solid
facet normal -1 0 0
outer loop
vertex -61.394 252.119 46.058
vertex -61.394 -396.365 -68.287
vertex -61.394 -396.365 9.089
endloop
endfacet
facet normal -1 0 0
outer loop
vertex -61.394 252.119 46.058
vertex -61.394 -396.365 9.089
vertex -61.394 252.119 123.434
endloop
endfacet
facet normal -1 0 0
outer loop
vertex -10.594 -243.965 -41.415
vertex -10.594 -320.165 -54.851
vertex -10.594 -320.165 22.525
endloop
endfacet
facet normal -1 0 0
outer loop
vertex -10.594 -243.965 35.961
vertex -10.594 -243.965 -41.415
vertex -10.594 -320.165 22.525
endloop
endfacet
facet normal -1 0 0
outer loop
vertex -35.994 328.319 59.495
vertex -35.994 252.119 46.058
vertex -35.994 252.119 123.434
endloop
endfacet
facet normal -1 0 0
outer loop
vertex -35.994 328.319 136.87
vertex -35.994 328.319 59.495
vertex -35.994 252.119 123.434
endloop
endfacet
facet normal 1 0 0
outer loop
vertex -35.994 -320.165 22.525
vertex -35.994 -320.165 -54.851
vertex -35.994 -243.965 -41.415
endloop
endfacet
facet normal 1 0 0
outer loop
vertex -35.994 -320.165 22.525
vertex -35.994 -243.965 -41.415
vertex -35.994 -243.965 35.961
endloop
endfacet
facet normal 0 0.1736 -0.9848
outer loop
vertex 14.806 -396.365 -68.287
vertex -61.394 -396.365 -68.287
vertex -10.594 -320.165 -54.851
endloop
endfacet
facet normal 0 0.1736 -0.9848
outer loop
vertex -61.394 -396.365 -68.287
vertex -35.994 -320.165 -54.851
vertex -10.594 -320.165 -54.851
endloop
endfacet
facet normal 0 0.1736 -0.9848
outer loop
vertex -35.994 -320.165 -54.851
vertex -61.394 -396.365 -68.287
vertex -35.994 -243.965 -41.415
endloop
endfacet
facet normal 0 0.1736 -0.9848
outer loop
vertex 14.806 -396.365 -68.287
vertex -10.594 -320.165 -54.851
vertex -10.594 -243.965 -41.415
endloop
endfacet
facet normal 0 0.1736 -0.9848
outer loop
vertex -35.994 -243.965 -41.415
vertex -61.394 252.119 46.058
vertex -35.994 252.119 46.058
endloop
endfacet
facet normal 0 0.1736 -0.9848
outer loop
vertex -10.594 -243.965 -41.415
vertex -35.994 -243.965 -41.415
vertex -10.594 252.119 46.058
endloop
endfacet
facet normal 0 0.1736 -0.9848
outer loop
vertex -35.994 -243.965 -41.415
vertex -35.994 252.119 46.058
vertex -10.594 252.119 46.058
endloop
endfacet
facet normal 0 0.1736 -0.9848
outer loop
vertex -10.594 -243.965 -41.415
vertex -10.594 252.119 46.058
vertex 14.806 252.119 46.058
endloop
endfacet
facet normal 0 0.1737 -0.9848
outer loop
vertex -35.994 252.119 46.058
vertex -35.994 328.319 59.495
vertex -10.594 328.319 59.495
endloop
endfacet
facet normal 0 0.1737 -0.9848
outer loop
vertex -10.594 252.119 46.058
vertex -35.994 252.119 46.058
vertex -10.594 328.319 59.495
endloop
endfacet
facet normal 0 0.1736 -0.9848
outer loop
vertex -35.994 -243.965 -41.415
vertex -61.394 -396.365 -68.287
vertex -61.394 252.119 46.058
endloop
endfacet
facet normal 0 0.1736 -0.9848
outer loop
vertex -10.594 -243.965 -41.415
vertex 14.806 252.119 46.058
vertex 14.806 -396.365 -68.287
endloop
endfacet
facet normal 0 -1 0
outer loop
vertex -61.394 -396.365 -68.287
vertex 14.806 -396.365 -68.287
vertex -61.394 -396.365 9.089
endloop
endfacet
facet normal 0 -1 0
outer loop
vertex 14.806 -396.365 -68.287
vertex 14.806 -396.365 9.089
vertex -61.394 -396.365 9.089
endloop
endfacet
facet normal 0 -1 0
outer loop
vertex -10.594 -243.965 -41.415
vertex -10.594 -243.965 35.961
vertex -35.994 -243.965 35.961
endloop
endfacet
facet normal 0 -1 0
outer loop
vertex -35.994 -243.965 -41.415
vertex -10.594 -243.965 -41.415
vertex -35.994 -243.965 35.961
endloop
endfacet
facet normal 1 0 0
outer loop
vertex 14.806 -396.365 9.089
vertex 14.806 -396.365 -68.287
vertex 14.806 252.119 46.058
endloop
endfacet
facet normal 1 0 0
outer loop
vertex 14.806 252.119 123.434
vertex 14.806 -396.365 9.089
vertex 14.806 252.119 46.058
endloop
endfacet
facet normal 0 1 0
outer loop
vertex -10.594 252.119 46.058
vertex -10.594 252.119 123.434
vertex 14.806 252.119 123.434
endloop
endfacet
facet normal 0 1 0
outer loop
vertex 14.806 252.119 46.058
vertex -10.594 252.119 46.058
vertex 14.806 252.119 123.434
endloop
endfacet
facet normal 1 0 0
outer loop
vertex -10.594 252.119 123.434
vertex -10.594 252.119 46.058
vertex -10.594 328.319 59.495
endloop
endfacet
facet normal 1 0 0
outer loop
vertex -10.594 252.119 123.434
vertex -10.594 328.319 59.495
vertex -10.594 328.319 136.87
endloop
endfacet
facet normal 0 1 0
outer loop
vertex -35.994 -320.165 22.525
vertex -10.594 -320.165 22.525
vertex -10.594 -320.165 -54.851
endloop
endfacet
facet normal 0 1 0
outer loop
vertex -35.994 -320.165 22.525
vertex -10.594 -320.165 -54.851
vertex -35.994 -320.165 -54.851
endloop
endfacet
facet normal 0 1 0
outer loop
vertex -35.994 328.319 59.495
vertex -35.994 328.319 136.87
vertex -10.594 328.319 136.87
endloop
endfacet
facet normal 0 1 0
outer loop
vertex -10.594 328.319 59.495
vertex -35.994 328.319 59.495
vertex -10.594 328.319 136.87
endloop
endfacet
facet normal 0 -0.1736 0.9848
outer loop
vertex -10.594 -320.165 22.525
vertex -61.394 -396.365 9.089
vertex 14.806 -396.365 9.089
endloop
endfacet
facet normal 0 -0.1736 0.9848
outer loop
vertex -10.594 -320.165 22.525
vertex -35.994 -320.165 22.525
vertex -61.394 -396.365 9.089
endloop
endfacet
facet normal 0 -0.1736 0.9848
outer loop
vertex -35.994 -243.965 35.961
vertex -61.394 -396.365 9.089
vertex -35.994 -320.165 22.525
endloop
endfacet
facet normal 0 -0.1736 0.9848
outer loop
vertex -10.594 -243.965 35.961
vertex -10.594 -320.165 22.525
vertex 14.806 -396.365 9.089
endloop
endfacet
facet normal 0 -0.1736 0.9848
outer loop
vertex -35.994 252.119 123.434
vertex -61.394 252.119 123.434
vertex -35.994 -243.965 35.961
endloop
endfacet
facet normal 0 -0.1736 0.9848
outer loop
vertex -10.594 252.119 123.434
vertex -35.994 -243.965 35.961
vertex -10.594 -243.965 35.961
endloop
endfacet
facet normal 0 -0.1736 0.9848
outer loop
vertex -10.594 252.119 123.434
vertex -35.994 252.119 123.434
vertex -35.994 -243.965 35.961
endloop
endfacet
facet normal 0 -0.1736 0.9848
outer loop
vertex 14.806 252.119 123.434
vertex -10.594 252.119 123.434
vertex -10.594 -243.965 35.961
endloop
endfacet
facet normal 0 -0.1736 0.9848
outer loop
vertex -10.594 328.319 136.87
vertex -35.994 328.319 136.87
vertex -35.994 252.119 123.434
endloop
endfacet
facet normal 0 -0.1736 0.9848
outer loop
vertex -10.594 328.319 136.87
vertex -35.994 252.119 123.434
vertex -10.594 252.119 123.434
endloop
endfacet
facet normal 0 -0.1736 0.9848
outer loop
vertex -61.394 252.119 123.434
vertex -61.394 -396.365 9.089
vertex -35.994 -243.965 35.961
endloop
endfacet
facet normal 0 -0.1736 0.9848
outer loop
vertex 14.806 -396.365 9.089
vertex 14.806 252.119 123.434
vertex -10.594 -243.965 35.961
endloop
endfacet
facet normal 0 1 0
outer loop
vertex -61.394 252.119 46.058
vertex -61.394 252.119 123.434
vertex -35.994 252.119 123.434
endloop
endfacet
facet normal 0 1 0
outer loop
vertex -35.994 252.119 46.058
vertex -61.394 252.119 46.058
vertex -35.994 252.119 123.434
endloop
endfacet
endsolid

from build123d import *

# Parameters (mm, degrees)
F2_W      = 76.2
F2_H      = 749.3
F3_DEPTH  = 76.2
F5_W      = 25.4
F5_H      = 150.9289524655
F6_DEPTH  = 76.2
F7_W      = 88.9
F7_H      = 109.3234665417
F8_DEPTH  = 13.2329911382
F10_W     = 121.5671412647
F10_H     = 124.9910257757
F11_DEPTH = 25.4
F13_W     = 25.4
F13_H     = 183.5729926825
F14_DEPTH = 76.2


with BuildPart() as f3:
    # F2 (on face) → F3 (new body)
    with BuildSketch(Plane(origin=(0, -0.2741353876, 1.5546990396), x_dir=(1, 0, 0), z_dir=(0, -0.1736481777, 0.984807753))):
        with Locations((-23.2936060824, -27.5516035191)):
            Rectangle(F2_W, F2_H)
    extrude(amount=F3_DEPTH)

    # F5 (on face) → F6 (cut)
    with BuildSketch(Plane.XZ.offset(-328.3190653867)):
        with Locations((-48.6936060824, 61.4055776064)):
            Rectangle(F5_W, F5_H)
        with Locations((2.1063939176, 61.4055776064)):
            Rectangle(F5_W, F5_H)
    extrude(amount=F6_DEPTH, mode=Mode.SUBTRACT)

    # F7 (on face) → F8 (cut, through all)
    with BuildSketch(Plane.XZ.offset(-328.3190653867)):
        with Locations((-16.9436060824, 94.7153790316)):
            Rectangle(F7_W, F7_H)
    extrude(amount=-F8_DEPTH, mode=Mode.SUBTRACT)

    # F10 (on face) → F11 (cut)
    with BuildSketch(Plane(origin=(0, -396.3653928071, 0), x_dir=(-1, 0, 0), z_dir=(0, 1, 0))):
        with Locations((6.2730181962, -37.5579986721)):
            Rectangle(F10_W, F10_H)
    extrude(amount=-F11_DEPTH, mode=Mode.SUBTRACT)

    # F13 (on face) → F14 (cut)
    with BuildSketch(Plane(origin=(0, -243.9653928071, 0), x_dir=(-1, 0, 0), z_dir=(0, 1, 0))):
        with Locations((23.2936060824, -0.4609301686)):
            Rectangle(F13_W, F13_H)
    extrude(amount=-F14_DEPTH, mode=Mode.SUBTRACT)


solid = f3.part
